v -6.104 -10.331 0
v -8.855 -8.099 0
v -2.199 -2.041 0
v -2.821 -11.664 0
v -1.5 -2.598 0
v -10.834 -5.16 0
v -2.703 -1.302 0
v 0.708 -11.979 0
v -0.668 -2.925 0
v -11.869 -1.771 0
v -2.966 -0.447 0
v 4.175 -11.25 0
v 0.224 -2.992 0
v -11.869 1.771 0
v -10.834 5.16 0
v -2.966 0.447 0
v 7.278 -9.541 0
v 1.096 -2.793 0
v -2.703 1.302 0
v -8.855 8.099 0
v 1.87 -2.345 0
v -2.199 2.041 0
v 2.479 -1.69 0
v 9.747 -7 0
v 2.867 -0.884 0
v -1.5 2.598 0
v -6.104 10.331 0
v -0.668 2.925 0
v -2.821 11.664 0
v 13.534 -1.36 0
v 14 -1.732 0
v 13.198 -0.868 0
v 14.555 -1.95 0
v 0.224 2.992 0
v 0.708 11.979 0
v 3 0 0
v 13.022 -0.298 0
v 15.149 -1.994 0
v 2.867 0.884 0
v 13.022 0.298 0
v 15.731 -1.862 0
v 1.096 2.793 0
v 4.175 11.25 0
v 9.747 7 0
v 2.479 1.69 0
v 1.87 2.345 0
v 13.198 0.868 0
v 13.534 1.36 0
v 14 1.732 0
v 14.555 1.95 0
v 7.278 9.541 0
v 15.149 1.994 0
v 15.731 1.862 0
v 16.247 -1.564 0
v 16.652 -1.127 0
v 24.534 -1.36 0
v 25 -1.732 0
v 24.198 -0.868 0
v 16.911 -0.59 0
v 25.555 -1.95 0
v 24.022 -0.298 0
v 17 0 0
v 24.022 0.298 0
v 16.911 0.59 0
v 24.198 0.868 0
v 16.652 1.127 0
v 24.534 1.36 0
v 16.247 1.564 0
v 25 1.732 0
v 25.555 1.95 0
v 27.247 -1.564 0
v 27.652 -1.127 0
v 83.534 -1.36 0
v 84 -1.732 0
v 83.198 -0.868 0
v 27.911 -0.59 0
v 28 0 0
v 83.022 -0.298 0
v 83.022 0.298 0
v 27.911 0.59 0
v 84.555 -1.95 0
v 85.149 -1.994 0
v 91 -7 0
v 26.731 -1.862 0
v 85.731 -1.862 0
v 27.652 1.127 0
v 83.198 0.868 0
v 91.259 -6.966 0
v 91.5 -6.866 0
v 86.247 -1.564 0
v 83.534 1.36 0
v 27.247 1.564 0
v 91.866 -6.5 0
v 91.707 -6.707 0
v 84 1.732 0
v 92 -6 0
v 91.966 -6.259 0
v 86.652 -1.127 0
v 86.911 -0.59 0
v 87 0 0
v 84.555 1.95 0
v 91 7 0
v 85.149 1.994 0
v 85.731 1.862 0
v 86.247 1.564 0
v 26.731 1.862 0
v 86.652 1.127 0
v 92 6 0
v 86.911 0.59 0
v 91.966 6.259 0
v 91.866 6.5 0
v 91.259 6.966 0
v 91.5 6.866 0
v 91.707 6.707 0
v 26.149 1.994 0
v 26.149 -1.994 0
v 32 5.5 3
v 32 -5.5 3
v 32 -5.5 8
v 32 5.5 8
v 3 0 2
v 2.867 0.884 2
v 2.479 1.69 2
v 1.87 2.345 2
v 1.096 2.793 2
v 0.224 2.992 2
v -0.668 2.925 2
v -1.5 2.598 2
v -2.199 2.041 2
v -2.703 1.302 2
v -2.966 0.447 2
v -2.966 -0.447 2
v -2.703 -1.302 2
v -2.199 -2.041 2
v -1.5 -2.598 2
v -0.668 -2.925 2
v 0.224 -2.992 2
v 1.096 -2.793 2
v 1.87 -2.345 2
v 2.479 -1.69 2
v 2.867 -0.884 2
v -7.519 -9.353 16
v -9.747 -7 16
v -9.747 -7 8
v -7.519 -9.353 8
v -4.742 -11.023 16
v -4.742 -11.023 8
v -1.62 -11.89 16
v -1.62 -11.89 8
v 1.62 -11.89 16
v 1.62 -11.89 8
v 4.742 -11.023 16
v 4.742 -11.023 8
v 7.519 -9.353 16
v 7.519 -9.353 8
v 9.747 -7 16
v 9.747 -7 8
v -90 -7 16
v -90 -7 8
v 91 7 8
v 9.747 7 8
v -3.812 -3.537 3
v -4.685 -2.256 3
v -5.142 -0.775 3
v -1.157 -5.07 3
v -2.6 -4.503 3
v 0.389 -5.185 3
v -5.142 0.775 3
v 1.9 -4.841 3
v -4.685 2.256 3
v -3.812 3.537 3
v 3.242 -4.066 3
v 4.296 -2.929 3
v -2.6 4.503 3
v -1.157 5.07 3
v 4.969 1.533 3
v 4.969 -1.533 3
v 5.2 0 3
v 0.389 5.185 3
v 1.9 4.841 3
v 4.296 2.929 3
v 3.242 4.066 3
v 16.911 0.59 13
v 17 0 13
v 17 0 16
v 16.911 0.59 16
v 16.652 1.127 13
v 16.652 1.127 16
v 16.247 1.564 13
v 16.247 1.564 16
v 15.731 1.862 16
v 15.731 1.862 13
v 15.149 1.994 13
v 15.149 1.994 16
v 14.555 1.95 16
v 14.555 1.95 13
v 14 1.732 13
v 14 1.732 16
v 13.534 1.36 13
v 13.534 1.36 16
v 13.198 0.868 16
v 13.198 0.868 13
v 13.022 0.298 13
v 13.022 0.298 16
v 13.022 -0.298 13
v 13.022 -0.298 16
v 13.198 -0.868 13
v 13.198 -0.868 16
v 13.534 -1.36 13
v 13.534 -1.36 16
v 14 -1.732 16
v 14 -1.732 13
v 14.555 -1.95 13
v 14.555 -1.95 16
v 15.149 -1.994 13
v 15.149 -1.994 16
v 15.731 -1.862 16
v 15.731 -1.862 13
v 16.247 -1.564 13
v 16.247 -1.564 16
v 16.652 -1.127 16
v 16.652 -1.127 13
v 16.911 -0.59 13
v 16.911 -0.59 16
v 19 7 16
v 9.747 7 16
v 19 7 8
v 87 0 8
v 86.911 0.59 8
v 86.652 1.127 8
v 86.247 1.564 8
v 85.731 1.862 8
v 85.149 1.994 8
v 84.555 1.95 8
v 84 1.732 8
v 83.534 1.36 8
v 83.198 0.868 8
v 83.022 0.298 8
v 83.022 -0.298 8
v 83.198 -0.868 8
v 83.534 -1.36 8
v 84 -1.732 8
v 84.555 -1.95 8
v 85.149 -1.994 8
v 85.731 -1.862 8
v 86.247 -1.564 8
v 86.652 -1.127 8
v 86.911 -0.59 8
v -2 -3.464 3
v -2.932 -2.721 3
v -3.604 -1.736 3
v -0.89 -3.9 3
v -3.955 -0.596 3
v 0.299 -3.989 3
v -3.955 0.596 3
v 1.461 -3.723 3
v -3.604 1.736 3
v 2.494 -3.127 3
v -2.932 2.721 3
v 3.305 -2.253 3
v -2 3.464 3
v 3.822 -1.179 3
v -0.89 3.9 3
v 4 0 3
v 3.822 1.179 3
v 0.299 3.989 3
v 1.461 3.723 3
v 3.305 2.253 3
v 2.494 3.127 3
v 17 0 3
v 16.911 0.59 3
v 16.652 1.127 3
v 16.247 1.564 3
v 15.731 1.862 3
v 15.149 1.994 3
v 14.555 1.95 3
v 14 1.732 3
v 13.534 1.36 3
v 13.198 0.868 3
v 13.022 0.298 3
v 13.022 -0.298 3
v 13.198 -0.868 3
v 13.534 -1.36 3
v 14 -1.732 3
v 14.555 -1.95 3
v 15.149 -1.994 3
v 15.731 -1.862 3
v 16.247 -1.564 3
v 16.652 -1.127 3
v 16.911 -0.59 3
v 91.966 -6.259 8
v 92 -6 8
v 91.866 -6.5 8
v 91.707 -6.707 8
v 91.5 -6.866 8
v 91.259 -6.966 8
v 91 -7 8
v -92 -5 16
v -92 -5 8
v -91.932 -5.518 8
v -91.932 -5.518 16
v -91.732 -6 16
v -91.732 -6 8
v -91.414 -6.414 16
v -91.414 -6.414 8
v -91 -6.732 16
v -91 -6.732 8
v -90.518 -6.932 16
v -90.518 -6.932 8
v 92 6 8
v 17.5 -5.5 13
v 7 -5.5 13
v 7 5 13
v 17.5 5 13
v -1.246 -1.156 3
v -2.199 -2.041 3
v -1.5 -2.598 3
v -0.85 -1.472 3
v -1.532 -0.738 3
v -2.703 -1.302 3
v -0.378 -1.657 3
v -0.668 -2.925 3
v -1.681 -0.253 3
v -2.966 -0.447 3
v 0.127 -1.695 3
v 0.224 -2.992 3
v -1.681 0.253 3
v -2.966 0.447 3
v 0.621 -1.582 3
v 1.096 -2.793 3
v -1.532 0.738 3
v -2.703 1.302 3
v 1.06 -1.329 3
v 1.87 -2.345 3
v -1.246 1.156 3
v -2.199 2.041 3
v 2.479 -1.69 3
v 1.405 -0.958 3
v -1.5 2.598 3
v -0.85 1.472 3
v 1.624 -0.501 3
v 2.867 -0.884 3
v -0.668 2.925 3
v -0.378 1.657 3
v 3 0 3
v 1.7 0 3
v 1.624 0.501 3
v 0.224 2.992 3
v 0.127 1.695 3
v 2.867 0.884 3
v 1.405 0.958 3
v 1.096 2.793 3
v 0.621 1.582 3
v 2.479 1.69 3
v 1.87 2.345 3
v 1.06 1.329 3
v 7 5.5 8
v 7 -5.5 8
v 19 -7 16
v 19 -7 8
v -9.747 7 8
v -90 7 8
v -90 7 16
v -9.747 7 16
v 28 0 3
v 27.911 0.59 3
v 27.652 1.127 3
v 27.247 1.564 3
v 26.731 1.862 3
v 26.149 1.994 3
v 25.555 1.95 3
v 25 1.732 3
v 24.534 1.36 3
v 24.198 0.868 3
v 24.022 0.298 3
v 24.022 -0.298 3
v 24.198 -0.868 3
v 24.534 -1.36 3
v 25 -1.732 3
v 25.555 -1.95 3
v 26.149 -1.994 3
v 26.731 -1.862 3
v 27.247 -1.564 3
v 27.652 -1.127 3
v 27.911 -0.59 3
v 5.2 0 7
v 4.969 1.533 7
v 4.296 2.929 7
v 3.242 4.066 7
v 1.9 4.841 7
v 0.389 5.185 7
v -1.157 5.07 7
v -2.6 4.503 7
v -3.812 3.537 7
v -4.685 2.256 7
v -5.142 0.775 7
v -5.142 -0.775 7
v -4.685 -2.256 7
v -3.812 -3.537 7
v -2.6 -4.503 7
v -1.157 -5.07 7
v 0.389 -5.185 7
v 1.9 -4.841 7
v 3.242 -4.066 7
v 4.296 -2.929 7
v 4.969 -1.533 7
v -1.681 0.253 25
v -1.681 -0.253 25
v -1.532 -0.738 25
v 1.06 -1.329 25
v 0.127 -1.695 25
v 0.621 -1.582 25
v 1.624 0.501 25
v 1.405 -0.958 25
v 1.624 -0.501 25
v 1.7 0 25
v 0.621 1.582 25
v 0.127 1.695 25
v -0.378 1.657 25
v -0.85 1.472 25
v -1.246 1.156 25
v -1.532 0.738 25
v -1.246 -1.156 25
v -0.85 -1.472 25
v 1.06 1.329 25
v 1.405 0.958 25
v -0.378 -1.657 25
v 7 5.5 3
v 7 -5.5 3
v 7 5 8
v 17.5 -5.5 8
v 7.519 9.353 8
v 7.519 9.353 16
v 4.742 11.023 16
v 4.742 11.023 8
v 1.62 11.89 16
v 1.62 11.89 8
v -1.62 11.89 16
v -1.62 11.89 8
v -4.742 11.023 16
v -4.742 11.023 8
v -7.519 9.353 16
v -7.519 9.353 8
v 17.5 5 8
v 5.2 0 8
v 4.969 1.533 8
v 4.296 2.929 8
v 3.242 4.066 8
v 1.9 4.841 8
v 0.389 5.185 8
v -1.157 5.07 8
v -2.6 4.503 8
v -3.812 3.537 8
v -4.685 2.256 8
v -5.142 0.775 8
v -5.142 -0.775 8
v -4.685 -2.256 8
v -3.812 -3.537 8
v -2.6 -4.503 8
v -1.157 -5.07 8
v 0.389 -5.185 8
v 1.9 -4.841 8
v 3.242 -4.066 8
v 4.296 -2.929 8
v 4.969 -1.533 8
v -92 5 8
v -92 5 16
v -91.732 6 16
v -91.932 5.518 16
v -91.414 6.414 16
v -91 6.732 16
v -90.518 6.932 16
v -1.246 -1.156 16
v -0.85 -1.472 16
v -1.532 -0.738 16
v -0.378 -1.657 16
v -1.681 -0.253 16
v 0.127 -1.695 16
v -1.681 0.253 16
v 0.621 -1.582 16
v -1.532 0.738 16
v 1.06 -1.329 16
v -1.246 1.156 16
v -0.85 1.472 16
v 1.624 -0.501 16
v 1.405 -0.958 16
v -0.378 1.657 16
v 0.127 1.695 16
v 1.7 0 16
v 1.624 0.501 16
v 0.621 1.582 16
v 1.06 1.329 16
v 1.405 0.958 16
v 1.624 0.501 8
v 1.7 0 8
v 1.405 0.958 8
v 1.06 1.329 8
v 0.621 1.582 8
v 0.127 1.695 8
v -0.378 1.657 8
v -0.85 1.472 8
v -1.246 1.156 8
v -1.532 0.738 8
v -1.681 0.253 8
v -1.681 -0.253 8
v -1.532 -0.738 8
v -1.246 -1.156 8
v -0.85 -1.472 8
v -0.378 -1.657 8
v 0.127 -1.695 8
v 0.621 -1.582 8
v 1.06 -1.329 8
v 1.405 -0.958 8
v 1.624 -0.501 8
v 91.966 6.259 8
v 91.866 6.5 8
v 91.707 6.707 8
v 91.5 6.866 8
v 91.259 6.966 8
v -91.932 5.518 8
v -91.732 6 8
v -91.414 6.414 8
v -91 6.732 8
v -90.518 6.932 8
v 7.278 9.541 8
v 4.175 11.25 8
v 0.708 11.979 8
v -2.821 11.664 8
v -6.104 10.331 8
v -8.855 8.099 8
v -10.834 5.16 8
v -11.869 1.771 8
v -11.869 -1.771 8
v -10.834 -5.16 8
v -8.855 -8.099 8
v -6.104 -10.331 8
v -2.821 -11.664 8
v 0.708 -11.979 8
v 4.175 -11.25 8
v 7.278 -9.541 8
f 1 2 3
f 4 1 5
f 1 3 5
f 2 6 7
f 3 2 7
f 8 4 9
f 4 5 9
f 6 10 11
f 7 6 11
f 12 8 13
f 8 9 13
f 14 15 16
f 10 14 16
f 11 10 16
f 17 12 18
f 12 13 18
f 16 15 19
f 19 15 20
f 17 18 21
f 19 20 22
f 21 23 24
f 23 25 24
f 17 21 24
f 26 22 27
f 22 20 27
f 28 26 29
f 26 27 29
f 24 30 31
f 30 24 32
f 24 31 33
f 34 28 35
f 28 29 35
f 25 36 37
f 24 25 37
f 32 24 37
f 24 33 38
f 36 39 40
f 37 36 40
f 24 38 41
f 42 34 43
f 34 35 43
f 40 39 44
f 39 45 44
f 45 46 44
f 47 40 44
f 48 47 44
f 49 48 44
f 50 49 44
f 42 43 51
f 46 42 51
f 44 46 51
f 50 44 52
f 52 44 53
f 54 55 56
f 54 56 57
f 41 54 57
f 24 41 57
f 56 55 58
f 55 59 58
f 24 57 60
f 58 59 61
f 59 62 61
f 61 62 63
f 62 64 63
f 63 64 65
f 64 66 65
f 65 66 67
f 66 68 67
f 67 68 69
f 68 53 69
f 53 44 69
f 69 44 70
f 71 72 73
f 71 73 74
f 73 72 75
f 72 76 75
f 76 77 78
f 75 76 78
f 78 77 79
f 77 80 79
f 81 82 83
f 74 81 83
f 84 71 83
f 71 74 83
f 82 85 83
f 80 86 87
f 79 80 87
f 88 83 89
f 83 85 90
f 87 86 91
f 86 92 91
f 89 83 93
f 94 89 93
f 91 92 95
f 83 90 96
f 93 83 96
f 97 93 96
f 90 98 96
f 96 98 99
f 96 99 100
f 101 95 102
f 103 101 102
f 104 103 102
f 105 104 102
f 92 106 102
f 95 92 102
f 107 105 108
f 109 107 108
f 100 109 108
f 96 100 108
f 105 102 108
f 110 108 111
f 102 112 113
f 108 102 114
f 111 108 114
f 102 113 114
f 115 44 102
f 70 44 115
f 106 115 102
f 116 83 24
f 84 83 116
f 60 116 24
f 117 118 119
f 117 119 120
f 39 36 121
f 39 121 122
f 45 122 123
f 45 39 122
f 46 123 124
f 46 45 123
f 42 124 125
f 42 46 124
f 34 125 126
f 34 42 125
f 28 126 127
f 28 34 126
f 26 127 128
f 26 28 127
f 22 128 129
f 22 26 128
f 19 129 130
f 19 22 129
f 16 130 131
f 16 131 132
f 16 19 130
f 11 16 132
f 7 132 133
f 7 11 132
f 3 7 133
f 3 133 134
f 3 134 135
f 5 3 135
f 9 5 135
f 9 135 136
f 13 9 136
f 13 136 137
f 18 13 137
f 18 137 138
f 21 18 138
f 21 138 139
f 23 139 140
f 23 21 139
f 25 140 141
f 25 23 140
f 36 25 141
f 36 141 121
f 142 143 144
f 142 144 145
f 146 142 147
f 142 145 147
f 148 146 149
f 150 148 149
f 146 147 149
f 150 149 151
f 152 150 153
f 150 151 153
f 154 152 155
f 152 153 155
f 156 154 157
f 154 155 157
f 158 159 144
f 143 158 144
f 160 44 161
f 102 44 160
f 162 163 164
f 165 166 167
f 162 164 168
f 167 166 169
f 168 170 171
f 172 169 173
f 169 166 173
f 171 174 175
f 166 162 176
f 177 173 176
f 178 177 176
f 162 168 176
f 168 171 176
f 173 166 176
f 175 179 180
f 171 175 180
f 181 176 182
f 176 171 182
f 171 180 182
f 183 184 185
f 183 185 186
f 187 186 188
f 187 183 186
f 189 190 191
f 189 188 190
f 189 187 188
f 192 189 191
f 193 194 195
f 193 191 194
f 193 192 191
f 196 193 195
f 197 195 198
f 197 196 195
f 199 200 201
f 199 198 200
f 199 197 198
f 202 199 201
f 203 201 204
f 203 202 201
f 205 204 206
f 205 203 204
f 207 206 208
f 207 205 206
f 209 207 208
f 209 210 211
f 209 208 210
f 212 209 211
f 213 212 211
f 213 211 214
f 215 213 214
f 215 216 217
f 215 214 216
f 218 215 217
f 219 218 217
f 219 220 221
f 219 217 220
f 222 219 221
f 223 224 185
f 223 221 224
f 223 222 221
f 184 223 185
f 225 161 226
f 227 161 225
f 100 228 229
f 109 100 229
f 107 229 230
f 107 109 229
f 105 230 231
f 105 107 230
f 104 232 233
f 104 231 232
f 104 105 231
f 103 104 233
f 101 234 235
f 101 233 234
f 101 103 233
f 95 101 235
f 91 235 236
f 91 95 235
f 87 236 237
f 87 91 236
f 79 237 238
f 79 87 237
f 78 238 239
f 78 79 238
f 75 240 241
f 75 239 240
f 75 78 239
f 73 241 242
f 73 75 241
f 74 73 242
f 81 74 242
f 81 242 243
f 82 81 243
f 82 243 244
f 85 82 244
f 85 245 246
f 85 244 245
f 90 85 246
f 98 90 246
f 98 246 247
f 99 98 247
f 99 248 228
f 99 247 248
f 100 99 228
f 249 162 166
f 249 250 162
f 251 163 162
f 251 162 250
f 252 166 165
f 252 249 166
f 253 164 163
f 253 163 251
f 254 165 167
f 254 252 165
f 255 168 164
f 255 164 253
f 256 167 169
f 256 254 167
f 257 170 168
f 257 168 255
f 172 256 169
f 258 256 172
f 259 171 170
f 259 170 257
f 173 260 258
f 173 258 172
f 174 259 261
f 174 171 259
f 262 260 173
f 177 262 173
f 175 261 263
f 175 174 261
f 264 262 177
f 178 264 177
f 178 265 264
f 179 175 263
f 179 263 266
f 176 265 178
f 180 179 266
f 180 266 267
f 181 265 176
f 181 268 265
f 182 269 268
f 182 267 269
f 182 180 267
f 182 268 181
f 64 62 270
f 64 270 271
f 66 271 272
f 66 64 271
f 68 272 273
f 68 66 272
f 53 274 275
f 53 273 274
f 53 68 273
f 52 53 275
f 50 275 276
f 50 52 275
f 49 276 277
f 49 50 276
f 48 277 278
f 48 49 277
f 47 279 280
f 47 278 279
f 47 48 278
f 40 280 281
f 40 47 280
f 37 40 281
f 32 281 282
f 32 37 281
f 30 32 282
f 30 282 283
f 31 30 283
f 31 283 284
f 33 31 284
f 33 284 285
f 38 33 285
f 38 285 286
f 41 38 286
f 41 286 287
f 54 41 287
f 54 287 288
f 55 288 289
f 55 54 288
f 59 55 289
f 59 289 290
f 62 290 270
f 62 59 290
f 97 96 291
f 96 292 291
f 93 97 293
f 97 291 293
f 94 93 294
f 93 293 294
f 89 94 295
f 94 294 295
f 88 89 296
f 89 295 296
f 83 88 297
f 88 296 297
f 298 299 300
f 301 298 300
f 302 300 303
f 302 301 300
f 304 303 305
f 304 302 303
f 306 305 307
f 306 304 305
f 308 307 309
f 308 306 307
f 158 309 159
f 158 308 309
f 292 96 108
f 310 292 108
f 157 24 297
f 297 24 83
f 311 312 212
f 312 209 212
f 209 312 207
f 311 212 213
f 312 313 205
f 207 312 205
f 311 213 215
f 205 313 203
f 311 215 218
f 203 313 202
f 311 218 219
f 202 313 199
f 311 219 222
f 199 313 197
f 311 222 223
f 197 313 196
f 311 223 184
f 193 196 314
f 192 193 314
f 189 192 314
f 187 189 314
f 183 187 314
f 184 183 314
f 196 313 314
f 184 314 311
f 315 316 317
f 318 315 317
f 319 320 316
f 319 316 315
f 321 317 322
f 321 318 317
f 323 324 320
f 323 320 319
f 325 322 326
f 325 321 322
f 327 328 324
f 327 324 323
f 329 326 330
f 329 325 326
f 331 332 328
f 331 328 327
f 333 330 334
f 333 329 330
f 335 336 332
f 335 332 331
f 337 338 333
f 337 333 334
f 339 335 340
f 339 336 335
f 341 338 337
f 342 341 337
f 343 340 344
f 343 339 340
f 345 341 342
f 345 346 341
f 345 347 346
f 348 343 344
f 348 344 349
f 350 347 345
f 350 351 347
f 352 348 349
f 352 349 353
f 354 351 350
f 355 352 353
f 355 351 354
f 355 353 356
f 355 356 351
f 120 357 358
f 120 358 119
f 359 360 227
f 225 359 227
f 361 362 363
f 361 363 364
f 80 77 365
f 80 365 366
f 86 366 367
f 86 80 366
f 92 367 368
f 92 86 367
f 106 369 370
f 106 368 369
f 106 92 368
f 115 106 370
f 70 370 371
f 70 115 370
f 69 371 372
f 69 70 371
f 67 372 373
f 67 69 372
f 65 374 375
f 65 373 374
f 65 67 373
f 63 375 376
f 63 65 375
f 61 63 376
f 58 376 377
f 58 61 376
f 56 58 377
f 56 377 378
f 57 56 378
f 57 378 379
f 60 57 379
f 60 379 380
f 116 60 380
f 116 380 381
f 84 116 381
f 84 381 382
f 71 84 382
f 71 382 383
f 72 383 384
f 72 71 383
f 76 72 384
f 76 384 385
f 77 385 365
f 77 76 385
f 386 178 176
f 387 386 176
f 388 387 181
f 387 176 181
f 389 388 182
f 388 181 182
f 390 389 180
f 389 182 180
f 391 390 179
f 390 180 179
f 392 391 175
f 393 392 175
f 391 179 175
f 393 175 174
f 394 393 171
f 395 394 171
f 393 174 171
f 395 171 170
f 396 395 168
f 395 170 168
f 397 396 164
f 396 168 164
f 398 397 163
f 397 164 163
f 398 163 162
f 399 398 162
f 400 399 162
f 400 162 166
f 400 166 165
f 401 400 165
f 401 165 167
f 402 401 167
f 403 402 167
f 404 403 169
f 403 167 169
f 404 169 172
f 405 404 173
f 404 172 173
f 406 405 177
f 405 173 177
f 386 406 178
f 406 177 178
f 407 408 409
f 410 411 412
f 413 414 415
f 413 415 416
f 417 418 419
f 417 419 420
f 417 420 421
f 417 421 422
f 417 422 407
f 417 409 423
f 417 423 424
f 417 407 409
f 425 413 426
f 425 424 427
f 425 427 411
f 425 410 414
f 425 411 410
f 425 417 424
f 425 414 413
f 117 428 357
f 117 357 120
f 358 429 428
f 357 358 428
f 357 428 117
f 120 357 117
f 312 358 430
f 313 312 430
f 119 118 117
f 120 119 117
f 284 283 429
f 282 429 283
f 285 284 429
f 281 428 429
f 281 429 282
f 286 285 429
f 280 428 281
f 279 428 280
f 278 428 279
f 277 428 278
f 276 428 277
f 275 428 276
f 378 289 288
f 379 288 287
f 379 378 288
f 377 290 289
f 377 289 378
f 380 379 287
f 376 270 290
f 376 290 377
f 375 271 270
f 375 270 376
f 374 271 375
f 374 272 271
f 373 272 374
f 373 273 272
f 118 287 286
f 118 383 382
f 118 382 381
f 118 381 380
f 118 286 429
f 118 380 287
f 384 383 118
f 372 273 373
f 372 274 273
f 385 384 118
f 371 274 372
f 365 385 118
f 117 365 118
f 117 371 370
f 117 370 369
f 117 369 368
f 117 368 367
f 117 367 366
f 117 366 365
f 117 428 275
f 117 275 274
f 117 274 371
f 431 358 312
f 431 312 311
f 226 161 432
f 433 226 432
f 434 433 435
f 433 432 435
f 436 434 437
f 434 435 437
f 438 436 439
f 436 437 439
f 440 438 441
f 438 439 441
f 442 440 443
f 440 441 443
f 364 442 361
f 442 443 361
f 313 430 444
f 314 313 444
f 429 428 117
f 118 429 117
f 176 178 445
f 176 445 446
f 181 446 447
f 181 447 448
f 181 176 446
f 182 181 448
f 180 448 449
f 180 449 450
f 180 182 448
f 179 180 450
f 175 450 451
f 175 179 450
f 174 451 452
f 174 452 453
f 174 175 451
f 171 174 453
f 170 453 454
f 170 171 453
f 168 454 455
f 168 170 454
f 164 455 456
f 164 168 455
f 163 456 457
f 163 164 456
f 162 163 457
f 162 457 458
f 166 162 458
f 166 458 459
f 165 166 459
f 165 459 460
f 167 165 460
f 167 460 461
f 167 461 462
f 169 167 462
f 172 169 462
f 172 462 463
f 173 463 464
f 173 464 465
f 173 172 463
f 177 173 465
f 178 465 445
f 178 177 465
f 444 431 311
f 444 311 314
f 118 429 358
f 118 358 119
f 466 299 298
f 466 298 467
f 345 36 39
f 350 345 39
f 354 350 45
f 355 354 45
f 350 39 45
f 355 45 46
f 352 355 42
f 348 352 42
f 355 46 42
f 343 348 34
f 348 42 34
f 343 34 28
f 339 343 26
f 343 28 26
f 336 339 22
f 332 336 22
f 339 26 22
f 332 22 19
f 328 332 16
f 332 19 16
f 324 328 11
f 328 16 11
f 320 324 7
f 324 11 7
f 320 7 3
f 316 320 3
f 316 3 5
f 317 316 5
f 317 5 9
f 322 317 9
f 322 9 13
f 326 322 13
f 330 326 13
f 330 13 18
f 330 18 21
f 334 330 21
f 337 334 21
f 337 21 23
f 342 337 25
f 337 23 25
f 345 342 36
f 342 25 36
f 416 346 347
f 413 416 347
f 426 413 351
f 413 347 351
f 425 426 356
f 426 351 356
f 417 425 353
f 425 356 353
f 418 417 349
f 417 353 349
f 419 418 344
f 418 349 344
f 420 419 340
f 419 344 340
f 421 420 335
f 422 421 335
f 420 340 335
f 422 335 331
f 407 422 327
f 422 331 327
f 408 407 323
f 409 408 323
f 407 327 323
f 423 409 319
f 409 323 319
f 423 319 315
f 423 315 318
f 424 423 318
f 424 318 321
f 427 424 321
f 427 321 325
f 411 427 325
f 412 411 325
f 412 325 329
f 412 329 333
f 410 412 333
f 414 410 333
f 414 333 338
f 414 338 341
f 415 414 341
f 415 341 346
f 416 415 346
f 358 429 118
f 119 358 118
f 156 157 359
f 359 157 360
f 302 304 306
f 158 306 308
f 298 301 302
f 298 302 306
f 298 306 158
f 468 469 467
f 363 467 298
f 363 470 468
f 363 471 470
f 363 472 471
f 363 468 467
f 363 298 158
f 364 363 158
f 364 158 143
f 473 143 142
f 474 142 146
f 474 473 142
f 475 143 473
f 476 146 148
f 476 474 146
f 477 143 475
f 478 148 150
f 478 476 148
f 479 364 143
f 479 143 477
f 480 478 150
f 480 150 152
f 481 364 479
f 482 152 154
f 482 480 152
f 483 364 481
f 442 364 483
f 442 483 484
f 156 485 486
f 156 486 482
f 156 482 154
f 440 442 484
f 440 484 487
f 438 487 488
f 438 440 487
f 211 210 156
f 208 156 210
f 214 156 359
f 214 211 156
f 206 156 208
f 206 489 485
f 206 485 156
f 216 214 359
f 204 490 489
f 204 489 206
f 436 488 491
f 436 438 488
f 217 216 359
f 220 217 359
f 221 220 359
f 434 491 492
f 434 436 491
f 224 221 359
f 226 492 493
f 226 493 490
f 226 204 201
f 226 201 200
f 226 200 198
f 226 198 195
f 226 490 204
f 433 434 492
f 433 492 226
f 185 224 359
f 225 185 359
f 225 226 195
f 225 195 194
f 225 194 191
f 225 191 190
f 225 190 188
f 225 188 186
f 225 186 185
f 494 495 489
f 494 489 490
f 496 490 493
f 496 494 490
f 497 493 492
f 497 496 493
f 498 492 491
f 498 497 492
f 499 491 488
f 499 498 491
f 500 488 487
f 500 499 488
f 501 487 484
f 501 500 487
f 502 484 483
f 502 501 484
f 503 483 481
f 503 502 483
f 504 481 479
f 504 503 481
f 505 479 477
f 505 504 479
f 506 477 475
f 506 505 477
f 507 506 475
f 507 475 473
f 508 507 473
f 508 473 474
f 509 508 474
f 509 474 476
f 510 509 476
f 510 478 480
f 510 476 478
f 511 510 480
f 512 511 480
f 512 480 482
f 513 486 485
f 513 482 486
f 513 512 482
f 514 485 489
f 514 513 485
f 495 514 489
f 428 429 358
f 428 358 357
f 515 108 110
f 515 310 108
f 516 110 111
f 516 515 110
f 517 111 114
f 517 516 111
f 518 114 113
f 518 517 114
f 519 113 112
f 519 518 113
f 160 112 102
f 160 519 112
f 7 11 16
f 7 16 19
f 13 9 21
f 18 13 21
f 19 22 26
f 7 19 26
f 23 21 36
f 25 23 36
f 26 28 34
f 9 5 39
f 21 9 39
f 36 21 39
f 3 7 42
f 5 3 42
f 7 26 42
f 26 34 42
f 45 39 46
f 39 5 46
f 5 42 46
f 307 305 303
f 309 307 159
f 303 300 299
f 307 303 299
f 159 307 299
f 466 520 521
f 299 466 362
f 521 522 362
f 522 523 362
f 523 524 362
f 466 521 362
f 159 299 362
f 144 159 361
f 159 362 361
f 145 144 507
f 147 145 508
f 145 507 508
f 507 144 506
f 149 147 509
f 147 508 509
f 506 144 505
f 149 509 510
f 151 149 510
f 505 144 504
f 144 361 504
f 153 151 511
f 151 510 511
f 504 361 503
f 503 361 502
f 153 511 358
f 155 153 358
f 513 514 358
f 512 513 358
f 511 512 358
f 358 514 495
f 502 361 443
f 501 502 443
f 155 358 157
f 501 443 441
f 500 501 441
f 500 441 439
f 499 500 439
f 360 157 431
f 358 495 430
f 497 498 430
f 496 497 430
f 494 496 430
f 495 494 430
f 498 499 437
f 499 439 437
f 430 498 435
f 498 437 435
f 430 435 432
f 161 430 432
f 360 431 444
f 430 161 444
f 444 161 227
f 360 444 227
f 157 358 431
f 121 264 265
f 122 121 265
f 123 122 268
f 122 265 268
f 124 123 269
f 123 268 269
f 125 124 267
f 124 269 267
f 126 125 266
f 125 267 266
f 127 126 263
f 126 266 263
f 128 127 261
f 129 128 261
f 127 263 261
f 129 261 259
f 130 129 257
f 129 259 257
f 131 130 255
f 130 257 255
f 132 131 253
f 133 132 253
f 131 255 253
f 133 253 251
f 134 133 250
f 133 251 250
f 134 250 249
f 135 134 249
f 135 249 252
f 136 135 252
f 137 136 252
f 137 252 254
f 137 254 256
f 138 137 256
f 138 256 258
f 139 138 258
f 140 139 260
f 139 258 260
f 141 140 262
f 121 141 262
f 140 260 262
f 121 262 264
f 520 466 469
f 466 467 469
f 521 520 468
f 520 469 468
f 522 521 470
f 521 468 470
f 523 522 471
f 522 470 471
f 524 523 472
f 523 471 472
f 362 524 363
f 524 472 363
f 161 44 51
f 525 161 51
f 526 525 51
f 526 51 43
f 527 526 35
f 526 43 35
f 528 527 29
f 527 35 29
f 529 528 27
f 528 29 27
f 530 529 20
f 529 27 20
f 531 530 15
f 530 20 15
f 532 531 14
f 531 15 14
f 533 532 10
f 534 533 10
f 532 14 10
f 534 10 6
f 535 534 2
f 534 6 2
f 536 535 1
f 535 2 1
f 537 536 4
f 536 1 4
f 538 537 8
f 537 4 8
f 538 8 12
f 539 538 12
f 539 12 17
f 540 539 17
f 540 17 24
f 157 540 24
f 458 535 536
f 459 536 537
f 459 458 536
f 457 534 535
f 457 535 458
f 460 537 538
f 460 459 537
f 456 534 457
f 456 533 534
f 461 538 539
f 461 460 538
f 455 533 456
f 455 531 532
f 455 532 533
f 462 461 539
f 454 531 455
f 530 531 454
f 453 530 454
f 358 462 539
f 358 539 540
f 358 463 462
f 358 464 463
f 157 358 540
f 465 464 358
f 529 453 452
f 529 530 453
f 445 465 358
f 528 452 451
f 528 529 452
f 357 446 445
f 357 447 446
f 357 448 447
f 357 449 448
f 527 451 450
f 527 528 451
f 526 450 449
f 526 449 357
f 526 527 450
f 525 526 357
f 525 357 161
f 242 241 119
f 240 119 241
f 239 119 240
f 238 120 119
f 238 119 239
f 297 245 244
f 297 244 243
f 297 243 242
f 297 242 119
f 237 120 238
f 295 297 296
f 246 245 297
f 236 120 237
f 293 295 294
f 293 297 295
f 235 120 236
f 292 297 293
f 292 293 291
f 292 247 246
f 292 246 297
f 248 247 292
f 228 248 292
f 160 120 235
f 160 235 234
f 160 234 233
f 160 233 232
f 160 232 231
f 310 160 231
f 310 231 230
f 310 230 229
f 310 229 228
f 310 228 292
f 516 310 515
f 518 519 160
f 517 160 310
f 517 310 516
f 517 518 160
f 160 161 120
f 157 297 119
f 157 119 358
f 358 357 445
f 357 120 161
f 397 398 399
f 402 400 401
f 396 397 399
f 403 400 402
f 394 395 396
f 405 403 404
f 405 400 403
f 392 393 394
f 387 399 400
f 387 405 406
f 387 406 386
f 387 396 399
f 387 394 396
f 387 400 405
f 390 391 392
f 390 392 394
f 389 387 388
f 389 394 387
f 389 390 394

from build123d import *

# Parameters (mm, degrees)
BOX_W             = 25
BOX_H             = 11
BOX_DEPTH         = 5
CYLINDER003_R     = 5.2
CYLINDER003_DEPTH = 4
CYLINDER002_R     = 3
CYLINDER002_DEPTH = 3
CYLINDER001_R     = 1.7
CYLINDER001_DEPTH = 25
CYLINDER007_R     = 2
CYLINDER007_DEPTH = 10
CYLINDER006_R     = 3
CYLINDER006_DEPTH = 3
CYLINDER005_R     = 1.7
CYLINDER005_DEPTH = 25
CYLINDER004_R     = 5.2
CYLINDER004_DEPTH = 5
CYLINDER009_R     = 2
CYLINDER009_DEPTH = 10
CYLINDER008_R     = 2
CYLINDER008_DEPTH = 10
BOX002_W          = 25
BOX002_H          = 11
BOX002_DEPTH      = 5
BOX001_W          = 92
BOX001_H          = 14
BOX001_DEPTH      = 8
CYLINDER_R        = 12
CYLINDER_DEPTH    = 8
CHAMFER_SIZE      = 1
FILLET_R          = 1
FILLET001_R       = 1
CYLINDER013_R     = 2
CYLINDER013_DEPTH = 10
BOX004_W          = 10.5
BOX004_H          = 10.5
BOX004_DEPTH      = 5
CYLINDER012_R     = 3
CYLINDER012_DEPTH = 3
CYLINDER011_R     = 1.7
CYLINDER011_DEPTH = 25
CYLINDER010_R     = 12
CYLINDER010_DEPTH = 8
BOX003_W          = 92
BOX003_H          = 14
BOX003_DEPTH      = 8
BOX005_W          = 10
BOX005_H          = 14
BOX005_DEPTH      = 8
FILLET002_R       = 2
FILLET003_R       = 2


with BuildPart() as long_magnet:
    # Box → Box (new body)
    with BuildSketch(Plane(origin=(7, -5.5, 3), x_dir=(1, 0, 0), z_dir=(0, 0, 1))):
        with Locations((12.5, 5.5)):
            Rectangle(BOX_W, BOX_H)
    extrude(amount=BOX_DEPTH)


with BuildPart() as bearing:
    # Cylinder003 → Cylinder003 (new body)
    with BuildSketch(Plane.XY.offset(3)):
        Circle(CYLINDER003_R)
    extrude(amount=CYLINDER003_DEPTH)


with BuildPart() as cylinder002:
    # Cylinder002 → Cylinder002 (new body)
    with BuildSketch(Plane.XY):
        Circle(CYLINDER002_R)
    extrude(amount=CYLINDER002_DEPTH)


with BuildPart() as screw:
    # Cylinder001 → Cylinder001 (new body)
    with BuildSketch(Plane.XY):
        Circle(CYLINDER001_R)
    extrude(amount=CYLINDER001_DEPTH)

    # Fusion: union Cylinder002
    add(cylinder002.part)


with BuildPart() as string_hole:
    # Cylinder007 → Cylinder007 (new body)
    with BuildSketch(Plane(origin=(85, 0, -1), x_dir=(1, 0, 0), z_dir=(0, 0, 1))):
        Circle(CYLINDER007_R)
    extrude(amount=CYLINDER007_DEPTH)


with BuildPart() as cylinder006:
    # Cylinder006 → Cylinder006 (new body)
    with BuildSketch(Plane.XY):
        Circle(CYLINDER006_R)
    extrude(amount=CYLINDER006_DEPTH)


with BuildPart() as screw001:
    # Cylinder005 → Cylinder005 (new body)
    with BuildSketch(Plane.XY):
        Circle(CYLINDER005_R)
    extrude(amount=CYLINDER005_DEPTH)

    # Fusion001: union Cylinder006
    add(cylinder006.part)


with BuildPart() as fusion004:
    # Cylinder004 → Cylinder004 (new body)
    with BuildSketch(Plane.XY.offset(3)):
        Circle(CYLINDER004_R)
    extrude(amount=CYLINDER004_DEPTH)

    # Fusion004: union Screw001
    add(screw001.part)


with BuildPart() as cylinder008:
    # Cylinder009 → Cylinder009 (new body)
    with BuildSketch(Plane(origin=(26, 0, -1), x_dir=(1, 0, 0), z_dir=(0, 0, 1))):
        Circle(CYLINDER009_R)
    extrude(amount=CYLINDER009_DEPTH)


with BuildPart() as fusion003:
    # Cylinder008 → Cylinder008 (new body)
    with BuildSketch(Plane(origin=(15, 0, -1), x_dir=(1, 0, 0), z_dir=(0, 0, 1))):
        Circle(CYLINDER008_R)
    extrude(amount=CYLINDER008_DEPTH)

    # Fusion003: union Cylinder008
    add(cylinder008.part)


with BuildPart() as long_magnet001:
    # Box002 → Box002 (new body)
    with BuildSketch(Plane(origin=(7, -5.5, 3), x_dir=(1, 0, 0), z_dir=(0, 0, 1))):
        with Locations((12.5, 5.5)):
            Rectangle(BOX002_W, BOX002_H)
    extrude(amount=BOX002_DEPTH)


with BuildPart() as cube:
    # Box001 → Box001 (new body)
    with BuildSketch(Plane(origin=(0, -7, 0), x_dir=(1, 0, 0), z_dir=(0, 0, 1))):
        with Locations((46, 7)):
            Rectangle(BOX001_W, BOX001_H)
    extrude(amount=BOX001_DEPTH)


with BuildPart() as fillet001:
    # Cylinder → Cylinder (new body)
    with BuildSketch(Plane.XY):
        Circle(CYLINDER_R)
    extrude(amount=CYLINDER_DEPTH)

    # Fusion002: union Cube
    add(cube.part)

    # Cut: cut Long Magnet001
    add(long_magnet001.part, mode=Mode.SUBTRACT)

    # Cut001: cut Fusion003
    add(fusion003.part, mode=Mode.SUBTRACT)

    # Cut002: cut Fusion004
    add(fusion004.part, mode=Mode.SUBTRACT)

    # Cut003: cut string hole
    add(string_hole.part, mode=Mode.SUBTRACT)

    # Chamfer
    chamfer_edges = [fillet001.edges().sort_by_distance(p)[0] for p in [
        (-3, 0, 3),
    ]]
    chamfer(chamfer_edges, length=CHAMFER_SIZE)

    # Fillet
    fillet_edges = [fillet001.edges().sort_by_distance(p)[0] for p in [
        (92, 7, 4),
    ]]
    fillet(fillet_edges, radius=FILLET_R)

    # Fillet001
    fillet001_edges = [fillet001.edges().sort_by_distance(p)[0] for p in [
        (92, -7, 4),
    ]]
    fillet(fillet001_edges, radius=FILLET001_R)


with BuildPart() as cylinder013:
    # Cylinder013 → Cylinder013 (new body)
    with BuildSketch(Plane(origin=(15, 0, 8), x_dir=(1, 0, 0), z_dir=(0, 0, 1))):
        Circle(CYLINDER013_R)
    extrude(amount=CYLINDER013_DEPTH)


with BuildPart() as square_magnet:
    # Box004 → Box004 (new body)
    with BuildSketch(Plane(origin=(7, -5.5, 8), x_dir=(1, 0, 0), z_dir=(0, 0, 1))):
        with Locations((5.25, 5.25)):
            Rectangle(BOX004_W, BOX004_H)
    extrude(amount=BOX004_DEPTH)


with BuildPart() as cylinder012:
    # Cylinder012 → Cylinder012 (new body)
    with BuildSketch(Plane.XY):
        Circle(CYLINDER012_R)
    extrude(amount=CYLINDER012_DEPTH)


with BuildPart() as screw002:
    # Cylinder011 → Cylinder011 (new body)
    with BuildSketch(Plane.XY):
        Circle(CYLINDER011_R)
    extrude(amount=CYLINDER011_DEPTH)

    # Fusion005: union Cylinder012
    add(cylinder012.part)


with BuildPart() as cylinder010:
    # Cylinder010 → Cylinder010 (new body)
    with BuildSketch(Plane.XY.offset(8)):
        Circle(CYLINDER010_R)
    extrude(amount=CYLINDER010_DEPTH)


with BuildPart() as cube001:
    # Box003 → Box003 (new body)
    with BuildSketch(Plane(origin=(-92, -7, 8), x_dir=(1, 0, 0), z_dir=(0, 0, 1))):
        with Locations((46, 7)):
            Rectangle(BOX003_W, BOX003_H)
    extrude(amount=BOX003_DEPTH)


with BuildPart() as fillet003:
    # Box005 → Box005 (new body)
    with BuildSketch(Plane(origin=(9, -7, 8), x_dir=(1, 0, 0), z_dir=(0, 0, 1))):
        with Locations((5, 7)):
            Rectangle(BOX005_W, BOX005_H)
    extrude(amount=BOX005_DEPTH)

    # Fusion006: union Cylinder010, Cube001
    add(cylinder010.part)
    add(cube001.part)

    # Cut004: cut Screw002
    add(screw002.part, mode=Mode.SUBTRACT)

    # Cut005: cut Square Magnet
    add(square_magnet.part, mode=Mode.SUBTRACT)

    # Cut006: cut Cylinder013
    add(cylinder013.part, mode=Mode.SUBTRACT)

    # Fillet002
    fillet002_edges = [fillet003.edges().sort_by_distance(p)[0] for p in [
        (-92, 7, 12),
    ]]
    fillet(fillet002_edges, radius=FILLET002_R)

    # Fillet003
    fillet003_edges = [fillet003.edges().sort_by_distance(p)[0] for p in [
        (-92, -7, 12),
    ]]
    fillet(fillet003_edges, radius=FILLET003_R)


solid = Compound([long_magnet.part, bearing.part, screw.part, fillet001.part, fillet003.part])
